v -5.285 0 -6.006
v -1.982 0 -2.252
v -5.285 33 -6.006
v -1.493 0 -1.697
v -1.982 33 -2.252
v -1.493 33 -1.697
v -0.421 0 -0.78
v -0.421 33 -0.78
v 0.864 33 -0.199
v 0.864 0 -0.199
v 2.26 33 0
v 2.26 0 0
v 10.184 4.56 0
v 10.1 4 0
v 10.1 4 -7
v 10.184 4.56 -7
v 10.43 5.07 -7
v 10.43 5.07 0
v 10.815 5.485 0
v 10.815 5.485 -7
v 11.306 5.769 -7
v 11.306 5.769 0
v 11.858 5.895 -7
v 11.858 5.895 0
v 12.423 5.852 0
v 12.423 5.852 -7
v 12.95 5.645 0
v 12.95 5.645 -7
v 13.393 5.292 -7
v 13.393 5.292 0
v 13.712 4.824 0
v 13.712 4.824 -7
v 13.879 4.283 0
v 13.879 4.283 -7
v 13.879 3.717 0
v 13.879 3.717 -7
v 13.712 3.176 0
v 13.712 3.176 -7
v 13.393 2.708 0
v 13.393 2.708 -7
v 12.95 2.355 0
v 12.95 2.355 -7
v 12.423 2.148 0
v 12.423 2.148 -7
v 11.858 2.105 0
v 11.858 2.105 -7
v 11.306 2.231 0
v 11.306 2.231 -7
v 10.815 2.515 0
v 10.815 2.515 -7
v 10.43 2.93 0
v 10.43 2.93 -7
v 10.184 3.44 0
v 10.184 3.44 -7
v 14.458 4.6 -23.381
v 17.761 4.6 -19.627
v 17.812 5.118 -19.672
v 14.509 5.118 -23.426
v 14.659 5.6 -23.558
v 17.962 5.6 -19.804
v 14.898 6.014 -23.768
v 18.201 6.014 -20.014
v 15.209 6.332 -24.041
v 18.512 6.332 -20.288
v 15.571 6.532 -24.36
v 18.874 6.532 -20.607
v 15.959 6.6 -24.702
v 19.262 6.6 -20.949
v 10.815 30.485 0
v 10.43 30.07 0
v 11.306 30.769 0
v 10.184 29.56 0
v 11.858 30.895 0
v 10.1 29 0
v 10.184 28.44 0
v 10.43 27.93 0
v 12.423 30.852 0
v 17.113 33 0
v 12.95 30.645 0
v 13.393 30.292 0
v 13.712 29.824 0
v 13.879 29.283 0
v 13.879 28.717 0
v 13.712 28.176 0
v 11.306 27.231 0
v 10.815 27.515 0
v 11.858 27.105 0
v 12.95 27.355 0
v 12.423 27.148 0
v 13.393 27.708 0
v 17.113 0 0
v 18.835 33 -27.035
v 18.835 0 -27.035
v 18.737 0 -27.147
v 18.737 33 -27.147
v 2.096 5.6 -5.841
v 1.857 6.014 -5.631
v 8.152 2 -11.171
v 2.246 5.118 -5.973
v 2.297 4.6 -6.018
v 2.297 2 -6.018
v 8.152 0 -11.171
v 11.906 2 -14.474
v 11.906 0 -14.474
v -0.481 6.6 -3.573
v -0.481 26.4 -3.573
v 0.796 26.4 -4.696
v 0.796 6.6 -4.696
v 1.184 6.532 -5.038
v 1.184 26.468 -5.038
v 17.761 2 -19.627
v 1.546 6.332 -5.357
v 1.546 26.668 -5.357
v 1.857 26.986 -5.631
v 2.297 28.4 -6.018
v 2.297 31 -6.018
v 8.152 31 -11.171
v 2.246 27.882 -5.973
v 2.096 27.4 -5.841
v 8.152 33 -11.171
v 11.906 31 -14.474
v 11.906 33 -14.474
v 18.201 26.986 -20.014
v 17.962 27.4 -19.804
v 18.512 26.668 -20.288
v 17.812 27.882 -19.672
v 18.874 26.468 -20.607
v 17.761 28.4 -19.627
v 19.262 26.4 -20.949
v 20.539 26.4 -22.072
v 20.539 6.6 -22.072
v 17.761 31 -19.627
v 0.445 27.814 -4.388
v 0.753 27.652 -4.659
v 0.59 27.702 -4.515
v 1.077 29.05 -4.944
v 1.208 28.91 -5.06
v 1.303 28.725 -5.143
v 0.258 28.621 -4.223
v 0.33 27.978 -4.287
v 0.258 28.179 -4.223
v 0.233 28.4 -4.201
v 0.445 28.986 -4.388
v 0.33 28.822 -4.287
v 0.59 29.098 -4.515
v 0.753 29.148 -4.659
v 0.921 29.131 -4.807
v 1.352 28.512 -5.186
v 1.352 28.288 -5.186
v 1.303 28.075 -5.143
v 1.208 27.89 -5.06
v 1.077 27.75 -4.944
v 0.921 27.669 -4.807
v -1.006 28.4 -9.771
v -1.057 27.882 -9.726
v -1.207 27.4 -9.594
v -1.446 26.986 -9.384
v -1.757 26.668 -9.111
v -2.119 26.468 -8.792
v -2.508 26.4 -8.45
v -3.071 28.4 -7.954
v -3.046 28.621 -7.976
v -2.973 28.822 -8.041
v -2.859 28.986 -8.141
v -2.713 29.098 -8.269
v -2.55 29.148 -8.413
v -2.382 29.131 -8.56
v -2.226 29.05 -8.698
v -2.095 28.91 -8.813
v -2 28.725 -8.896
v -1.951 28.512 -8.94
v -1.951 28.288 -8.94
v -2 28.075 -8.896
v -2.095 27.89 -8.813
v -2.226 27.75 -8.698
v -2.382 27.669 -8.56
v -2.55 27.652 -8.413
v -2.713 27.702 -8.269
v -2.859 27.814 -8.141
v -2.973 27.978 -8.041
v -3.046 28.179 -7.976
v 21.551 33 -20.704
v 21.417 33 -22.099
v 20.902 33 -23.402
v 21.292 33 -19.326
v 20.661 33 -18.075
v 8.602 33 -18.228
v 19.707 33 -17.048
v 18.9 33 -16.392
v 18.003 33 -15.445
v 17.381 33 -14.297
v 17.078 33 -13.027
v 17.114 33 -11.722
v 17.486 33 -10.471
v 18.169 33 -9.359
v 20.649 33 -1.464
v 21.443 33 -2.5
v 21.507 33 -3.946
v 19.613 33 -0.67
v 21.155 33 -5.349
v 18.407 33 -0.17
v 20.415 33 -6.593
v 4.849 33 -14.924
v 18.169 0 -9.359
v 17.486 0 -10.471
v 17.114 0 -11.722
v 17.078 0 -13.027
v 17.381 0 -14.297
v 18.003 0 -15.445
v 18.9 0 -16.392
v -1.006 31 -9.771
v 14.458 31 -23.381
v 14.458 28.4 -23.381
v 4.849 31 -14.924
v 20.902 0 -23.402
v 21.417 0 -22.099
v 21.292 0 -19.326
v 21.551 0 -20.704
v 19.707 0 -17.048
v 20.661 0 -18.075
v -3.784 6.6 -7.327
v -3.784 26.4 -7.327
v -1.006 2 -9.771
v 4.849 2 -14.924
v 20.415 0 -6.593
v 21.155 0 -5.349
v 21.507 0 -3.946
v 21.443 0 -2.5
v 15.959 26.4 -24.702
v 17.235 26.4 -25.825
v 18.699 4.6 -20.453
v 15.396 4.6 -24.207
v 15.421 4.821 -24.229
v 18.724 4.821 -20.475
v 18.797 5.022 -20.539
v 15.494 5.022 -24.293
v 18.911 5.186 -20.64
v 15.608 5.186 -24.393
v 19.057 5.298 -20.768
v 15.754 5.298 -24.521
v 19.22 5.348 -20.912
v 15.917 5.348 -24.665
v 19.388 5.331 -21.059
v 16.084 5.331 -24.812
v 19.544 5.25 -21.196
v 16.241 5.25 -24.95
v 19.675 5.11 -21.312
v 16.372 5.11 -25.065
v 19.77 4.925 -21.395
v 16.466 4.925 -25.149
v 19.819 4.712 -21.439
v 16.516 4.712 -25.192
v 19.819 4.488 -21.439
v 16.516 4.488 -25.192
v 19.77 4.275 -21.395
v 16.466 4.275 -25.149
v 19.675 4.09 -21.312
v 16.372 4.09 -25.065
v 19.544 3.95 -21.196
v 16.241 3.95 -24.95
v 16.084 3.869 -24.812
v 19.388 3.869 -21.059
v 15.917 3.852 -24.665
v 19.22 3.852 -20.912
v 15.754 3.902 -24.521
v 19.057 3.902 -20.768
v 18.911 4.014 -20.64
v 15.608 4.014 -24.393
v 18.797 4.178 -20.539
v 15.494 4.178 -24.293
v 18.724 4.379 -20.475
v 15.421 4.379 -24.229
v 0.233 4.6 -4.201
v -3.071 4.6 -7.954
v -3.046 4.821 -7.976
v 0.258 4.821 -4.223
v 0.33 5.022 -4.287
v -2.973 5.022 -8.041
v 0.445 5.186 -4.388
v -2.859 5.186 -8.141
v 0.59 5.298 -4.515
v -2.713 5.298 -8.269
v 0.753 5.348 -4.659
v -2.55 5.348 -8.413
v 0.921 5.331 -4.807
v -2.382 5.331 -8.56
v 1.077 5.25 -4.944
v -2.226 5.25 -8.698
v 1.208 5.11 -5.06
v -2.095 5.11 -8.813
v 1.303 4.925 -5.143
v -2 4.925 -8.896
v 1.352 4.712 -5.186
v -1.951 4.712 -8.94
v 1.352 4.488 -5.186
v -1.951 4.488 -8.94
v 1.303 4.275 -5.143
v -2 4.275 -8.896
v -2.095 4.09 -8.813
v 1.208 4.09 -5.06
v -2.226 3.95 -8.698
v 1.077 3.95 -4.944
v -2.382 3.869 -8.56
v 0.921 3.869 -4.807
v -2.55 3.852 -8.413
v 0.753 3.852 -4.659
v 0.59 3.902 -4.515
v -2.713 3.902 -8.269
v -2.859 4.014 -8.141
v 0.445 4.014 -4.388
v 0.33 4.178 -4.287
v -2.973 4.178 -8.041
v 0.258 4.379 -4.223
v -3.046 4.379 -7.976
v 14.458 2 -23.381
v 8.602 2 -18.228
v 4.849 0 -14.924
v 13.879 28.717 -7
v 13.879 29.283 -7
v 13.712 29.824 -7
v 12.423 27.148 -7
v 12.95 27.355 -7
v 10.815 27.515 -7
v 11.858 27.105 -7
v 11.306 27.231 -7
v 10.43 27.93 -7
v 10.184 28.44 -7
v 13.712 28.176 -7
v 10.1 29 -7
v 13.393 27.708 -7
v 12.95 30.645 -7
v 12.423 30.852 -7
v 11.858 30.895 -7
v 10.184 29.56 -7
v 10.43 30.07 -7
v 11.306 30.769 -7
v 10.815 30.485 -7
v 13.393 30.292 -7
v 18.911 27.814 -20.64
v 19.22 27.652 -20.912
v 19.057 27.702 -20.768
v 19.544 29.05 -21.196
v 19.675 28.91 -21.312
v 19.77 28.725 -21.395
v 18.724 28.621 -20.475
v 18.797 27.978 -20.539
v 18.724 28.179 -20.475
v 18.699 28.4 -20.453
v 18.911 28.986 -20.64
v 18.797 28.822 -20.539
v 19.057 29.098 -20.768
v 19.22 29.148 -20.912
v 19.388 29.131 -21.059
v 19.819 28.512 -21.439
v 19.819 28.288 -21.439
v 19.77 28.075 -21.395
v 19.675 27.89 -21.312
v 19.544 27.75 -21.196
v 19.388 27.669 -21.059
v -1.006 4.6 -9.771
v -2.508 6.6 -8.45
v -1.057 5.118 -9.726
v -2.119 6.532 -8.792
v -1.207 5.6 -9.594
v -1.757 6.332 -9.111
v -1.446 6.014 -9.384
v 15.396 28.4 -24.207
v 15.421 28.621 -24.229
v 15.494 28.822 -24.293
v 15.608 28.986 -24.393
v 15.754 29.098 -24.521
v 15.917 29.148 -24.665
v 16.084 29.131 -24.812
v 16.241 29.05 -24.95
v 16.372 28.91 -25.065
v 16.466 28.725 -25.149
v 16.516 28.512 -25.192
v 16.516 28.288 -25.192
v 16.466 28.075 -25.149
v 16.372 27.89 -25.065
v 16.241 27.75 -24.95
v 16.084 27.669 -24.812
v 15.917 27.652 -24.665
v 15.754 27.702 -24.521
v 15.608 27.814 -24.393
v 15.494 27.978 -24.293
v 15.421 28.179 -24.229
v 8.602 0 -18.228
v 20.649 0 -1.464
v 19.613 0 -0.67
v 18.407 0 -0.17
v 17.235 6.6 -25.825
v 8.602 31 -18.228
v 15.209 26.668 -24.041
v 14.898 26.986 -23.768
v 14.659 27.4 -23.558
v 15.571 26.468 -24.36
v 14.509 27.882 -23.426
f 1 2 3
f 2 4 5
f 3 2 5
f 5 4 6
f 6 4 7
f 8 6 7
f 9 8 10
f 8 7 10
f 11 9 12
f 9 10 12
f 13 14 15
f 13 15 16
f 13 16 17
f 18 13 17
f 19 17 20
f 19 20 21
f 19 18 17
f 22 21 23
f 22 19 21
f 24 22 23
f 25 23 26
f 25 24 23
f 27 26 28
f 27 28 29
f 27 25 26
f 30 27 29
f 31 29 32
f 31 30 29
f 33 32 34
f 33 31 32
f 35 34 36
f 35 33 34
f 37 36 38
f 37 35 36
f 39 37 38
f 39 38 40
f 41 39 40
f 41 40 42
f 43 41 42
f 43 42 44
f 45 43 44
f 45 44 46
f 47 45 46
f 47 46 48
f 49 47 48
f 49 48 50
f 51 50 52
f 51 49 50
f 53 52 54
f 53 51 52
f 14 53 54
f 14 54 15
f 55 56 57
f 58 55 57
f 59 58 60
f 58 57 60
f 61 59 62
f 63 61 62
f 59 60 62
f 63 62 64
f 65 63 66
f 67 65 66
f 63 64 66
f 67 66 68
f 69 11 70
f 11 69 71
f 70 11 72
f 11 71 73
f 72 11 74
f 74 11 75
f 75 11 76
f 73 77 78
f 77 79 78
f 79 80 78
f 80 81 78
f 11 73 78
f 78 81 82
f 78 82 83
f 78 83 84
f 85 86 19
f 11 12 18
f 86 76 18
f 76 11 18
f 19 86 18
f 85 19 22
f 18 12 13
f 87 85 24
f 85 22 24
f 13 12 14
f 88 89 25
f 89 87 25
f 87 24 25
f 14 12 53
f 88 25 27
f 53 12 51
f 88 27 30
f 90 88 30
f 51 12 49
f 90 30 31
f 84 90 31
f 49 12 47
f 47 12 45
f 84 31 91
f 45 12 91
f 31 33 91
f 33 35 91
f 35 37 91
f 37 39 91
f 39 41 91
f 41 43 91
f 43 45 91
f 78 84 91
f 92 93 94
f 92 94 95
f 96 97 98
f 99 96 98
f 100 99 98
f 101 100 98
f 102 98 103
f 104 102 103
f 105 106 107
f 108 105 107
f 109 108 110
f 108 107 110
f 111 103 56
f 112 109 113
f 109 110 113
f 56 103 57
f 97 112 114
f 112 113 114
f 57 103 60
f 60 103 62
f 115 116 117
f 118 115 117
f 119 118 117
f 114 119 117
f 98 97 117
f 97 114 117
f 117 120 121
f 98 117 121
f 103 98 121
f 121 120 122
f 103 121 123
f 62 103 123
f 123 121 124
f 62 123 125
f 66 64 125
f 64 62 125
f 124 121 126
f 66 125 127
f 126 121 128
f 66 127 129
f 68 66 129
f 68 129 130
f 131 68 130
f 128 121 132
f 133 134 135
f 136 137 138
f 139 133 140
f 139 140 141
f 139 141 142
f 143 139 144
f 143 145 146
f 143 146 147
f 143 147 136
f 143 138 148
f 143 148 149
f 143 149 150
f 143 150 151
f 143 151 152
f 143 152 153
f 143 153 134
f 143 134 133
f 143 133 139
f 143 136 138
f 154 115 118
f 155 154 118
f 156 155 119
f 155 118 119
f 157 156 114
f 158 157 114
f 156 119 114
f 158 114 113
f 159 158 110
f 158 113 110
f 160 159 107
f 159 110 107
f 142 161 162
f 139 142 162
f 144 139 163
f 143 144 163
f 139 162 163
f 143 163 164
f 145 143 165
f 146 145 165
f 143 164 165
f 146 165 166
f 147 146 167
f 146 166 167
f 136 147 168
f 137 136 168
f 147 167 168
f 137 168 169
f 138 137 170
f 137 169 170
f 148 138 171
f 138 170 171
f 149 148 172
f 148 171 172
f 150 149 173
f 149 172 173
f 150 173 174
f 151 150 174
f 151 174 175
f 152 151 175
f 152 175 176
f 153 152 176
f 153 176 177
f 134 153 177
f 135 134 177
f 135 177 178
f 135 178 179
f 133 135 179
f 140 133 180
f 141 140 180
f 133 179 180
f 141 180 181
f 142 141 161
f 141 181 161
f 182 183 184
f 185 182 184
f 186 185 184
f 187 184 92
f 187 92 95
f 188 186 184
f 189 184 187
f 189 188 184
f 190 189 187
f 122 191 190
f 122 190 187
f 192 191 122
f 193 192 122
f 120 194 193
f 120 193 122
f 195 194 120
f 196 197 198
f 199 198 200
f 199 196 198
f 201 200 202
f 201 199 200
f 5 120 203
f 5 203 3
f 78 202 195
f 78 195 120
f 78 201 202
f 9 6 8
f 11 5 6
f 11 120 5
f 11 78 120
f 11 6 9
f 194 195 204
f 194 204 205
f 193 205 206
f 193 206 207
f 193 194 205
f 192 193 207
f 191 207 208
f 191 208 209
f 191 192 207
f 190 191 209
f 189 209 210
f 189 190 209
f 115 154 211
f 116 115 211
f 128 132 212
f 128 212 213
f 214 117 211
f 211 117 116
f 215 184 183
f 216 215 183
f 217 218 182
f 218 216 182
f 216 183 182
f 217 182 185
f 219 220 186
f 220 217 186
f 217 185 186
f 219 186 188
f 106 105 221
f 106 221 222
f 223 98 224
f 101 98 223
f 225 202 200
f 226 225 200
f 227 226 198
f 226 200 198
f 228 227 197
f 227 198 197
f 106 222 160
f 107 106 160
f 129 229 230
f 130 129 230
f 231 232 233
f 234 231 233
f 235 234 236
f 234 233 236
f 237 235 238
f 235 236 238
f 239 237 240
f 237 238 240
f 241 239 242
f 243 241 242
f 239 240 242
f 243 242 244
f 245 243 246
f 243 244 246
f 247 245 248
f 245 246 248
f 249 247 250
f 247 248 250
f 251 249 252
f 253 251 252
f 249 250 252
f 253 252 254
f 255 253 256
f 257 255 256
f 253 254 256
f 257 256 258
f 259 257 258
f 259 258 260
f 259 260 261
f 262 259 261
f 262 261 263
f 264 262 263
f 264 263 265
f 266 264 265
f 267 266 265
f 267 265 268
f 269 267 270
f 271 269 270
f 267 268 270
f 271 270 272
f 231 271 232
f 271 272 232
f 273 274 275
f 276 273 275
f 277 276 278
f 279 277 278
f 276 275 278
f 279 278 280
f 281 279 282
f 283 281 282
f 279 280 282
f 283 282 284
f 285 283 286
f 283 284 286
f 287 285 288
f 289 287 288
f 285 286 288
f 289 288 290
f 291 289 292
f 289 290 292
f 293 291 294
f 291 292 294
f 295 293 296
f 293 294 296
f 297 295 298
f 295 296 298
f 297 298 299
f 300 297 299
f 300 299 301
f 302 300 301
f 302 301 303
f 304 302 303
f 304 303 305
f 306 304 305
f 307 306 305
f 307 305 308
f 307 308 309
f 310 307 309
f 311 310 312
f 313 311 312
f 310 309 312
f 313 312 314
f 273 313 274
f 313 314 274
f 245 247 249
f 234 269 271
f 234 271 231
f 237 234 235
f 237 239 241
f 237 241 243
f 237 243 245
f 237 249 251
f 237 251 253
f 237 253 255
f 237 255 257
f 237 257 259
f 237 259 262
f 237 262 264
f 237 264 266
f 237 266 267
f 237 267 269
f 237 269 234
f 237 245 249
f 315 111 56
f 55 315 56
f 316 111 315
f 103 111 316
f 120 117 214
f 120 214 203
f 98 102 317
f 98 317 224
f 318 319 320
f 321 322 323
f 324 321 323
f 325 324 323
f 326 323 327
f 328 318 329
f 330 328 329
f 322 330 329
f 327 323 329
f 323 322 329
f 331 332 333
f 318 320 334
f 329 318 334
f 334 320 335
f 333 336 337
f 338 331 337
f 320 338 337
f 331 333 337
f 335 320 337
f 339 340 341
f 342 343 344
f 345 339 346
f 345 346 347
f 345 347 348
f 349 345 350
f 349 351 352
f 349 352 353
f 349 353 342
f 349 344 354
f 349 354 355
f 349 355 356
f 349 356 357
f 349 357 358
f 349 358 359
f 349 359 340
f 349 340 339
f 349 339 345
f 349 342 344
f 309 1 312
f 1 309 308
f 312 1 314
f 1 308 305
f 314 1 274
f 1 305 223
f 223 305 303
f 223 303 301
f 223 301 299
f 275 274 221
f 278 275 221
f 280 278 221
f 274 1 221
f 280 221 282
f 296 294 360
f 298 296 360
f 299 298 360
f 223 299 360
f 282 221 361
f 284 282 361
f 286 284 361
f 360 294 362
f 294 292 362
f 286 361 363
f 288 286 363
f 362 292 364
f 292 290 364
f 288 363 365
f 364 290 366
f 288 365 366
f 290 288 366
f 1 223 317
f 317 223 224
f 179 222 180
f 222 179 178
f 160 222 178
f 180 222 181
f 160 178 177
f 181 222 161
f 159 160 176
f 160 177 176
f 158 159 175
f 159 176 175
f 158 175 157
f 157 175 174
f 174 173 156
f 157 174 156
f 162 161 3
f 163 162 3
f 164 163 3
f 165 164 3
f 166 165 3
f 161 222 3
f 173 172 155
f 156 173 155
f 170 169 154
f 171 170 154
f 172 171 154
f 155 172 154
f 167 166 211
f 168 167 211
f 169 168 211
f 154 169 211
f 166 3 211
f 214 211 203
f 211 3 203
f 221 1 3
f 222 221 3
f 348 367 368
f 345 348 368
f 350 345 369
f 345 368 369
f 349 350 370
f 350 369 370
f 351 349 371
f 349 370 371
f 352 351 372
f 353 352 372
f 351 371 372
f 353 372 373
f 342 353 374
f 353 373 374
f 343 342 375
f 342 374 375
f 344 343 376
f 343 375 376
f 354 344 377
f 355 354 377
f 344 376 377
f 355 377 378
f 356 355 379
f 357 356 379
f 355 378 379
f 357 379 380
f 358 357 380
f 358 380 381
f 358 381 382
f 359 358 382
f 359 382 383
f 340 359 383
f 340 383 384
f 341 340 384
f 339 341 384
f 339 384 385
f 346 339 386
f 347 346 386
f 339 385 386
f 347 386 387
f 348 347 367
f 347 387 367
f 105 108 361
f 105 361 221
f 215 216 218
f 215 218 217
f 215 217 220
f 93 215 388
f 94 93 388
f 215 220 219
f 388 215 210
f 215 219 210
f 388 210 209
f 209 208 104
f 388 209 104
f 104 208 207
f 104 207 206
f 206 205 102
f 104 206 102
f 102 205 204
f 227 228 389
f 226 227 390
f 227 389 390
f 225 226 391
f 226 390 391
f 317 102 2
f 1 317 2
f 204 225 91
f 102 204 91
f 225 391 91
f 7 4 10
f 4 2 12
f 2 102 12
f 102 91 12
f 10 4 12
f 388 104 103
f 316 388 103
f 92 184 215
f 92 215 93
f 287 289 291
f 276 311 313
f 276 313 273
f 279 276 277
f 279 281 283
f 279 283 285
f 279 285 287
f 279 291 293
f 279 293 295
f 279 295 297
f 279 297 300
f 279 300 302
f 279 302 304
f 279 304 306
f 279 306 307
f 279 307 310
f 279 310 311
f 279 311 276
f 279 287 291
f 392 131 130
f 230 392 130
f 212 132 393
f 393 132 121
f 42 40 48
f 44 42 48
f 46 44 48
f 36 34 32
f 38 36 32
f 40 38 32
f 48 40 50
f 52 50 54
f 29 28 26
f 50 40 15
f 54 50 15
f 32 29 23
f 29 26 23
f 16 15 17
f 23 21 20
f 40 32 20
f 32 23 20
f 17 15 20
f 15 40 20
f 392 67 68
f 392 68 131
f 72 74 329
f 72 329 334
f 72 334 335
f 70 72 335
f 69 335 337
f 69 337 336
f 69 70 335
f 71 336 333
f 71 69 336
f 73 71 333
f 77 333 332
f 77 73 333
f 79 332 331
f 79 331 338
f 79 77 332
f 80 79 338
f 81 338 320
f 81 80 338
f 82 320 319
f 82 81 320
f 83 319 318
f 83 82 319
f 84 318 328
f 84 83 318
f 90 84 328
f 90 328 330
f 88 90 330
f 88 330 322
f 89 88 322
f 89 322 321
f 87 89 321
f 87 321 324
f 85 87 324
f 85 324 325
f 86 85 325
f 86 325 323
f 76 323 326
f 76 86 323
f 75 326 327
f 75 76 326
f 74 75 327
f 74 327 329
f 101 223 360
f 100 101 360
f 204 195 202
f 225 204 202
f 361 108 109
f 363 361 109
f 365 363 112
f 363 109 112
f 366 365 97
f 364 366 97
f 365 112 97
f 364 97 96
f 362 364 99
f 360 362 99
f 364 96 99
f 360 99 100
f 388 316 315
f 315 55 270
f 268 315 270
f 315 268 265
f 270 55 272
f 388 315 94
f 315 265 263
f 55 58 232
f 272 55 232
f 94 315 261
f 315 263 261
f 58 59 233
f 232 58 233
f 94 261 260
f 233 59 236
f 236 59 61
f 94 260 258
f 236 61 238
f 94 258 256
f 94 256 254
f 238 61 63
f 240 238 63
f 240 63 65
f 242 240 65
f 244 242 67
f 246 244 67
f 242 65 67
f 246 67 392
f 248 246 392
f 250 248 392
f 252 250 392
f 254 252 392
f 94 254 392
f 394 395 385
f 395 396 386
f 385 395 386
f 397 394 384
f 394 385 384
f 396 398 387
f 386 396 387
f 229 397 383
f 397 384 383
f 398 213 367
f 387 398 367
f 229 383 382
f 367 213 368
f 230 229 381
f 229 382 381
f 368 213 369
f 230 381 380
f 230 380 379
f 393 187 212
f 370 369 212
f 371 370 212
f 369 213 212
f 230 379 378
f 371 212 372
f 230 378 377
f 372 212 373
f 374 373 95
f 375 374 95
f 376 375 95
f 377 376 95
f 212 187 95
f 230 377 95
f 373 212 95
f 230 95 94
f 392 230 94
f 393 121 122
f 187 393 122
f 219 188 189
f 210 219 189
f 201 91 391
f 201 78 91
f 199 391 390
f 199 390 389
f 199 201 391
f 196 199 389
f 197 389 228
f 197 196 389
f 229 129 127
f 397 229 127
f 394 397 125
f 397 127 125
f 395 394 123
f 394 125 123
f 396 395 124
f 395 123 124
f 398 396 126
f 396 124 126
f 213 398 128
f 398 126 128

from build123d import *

# Parameters (mm, degrees)
BOSS_EXTRUDE1_DEPTH = 33
SKETCH2_W           = 32
SKETCH2_H           = 33
BOSS_EXTRUDE2_DEPTH = 3
SKETCH3_R           = 1.9
CUT_EXTRUDE1_DEPTH  = 7
FILLET1_R           = 5
SKETCH5_R           = 2
BOSS_EXTRUDE3_DEPTH = 5
SKETCH6_W           = 32
SKETCH6_H           = 33
SKETCH6_W_2         = 28
SKETCH6_H_2         = 29
BOSS_EXTRUDE4_DEPTH = 5
BOSS_EXTRUDE5_DEPTH = 5
SKETCH7_R           = 0.75
SKETCH7_W           = 5
SKETCH7_H           = 119.688008906
CUT_EXTRUDE3_DEPTH  = 5
CUT_EXTRUDE4_DEPTH  = 53.302482054
CUT_EXTRUDE5_DEPTH  = 51.632111281
FILLET4_R           = 5


with BuildPart() as part:
    # Sketch1 → Boss-Extrude1 (new body)
    with BuildSketch(Plane(origin=(0, 0, 0), x_dir=(1, 0, 0), z_dir=(0, 1, 0))):
        Polygon((0, 0), (20, 0), (30.159835274, 17.597350892), (24.022012397, 21.141024582), align=None)
    extrude(amount=BOSS_EXTRUDE1_DEPTH)

    # Sketch2 → Boss-Extrude2 (add)
    with BuildSketch(Plane(origin=(0, 0, 0), x_dir=(0.7506878874077226, 0, -0.660657018201828), z_dir=(0.660657018201828, 0, 0.7506878874077226))):
        with Locations((16, 16.5)):
            Rectangle(SKETCH2_W, SKETCH2_H)
    extrude(amount=-BOSS_EXTRUDE2_DEPTH)

    # Sketch3 → Cut-Extrude1 (cut)
    with BuildSketch(Plane(origin=(30, 0, 0), x_dir=(-1, 0, 0), z_dir=(0, 0, -1))):
        with Locations((18, 29)):
            Circle(SKETCH3_R)
        with Locations((18, 4)):
            Circle(SKETCH3_R)
    extrude(amount=CUT_EXTRUDE1_DEPTH, mode=Mode.SUBTRACT)

    # Fillet1
    fillet1_edges = [part.edges().sort_by_distance(p)[0] for p in [
        (20, 16.5, 0),
    ]]
    fillet(fillet1_edges, radius=FILLET1_R)

    # Sketch5 → Boss-Extrude3 (add)
    with BuildSketch(Plane(origin=(-1.981971055, 0, -2.252063662), x_dir=(-0.7506878874077226, 0, 0.660657018201828), z_dir=(-0.660657018201828, 0, -0.7506878874077226))):
        with Locations((-28.3, 28.4)):
            Circle(SKETCH5_R)
        with Locations((-3.7, 28.4)):
            Circle(SKETCH5_R)
        with Locations((-28.3, 4.6)):
            Circle(SKETCH5_R)
        with Locations((-3.7, 4.6)):
            Circle(SKETCH5_R)
    extrude(amount=BOSS_EXTRUDE3_DEPTH)

    # Sketch6 → Boss-Extrude4 (add)
    with BuildSketch(Plane(origin=(-1.981971055, 0, -2.252063662), x_dir=(-0.7506878874077226, 0, 0.660657018201828), z_dir=(-0.660657018201828, 0, -0.7506878874077226))):
        with Locations((-16, 16.5)):
            Rectangle(SKETCH6_W, SKETCH6_H)
        with Locations((-16, 16.5)):
            Rectangle(SKETCH6_W_2, SKETCH6_H_2, mode=Mode.SUBTRACT)
    extrude(amount=BOSS_EXTRUDE4_DEPTH)

    # Sketch9 → Boss-Extrude5 (add)
    with BuildSketch(Plane(origin=(-1.981971055, 0, -2.252063662), x_dir=(-0.7506878874077226, 0, 0.660657018201828), z_dir=(-0.660657018201828, 0, -0.7506878874077226))):
        Polygon((-28.3, 26.4), (-30, 26.4), (-30, 31), (-26.3, 31), (-26.3, 28.4), align=None)
        Polygon((-5.7, 28.4), (-5.7, 31), (-2, 31), (-2, 26.4), (-3.7, 26.4), align=None)
        Polygon((-3.7, 6.6), (-2, 6.6), (-2, 2), (-5.7, 2), (-5.7, 4.6), align=None)
        Polygon((-28.3, 6.6), (-30, 6.6), (-30, 2), (-26.3, 2), (-26.3, 4.6), align=None)
    extrude(amount=BOSS_EXTRUDE5_DEPTH)

    # Sketch7 → Cut-Extrude3 (cut)
    with BuildSketch(Plane(origin=(-5.285256146, 0, -6.005503099), x_dir=(-0.7506878874077226, 0, 0.660657018201828), z_dir=(-0.660657018201828, 0, -0.7506878874077226))):
        with Locations((-28.3, 28.4)):
            Circle(SKETCH7_R)
        with Locations((-3.7, 28.4)):
            Circle(SKETCH7_R)
        with Locations((-3.7, 4.6)):
            Circle(SKETCH7_R)
        with Locations((-28.3, 4.6)):
            Circle(SKETCH7_R)
        with Locations((-16, 31)):
            Rectangle(SKETCH7_W, SKETCH7_H)
    extrude(amount=-CUT_EXTRUDE3_DEPTH, mode=Mode.SUBTRACT)

    # Sketch8 → Cut-Extrude4 (cut, through all)
    with BuildSketch(Plane(origin=(0, 33, 0), x_dir=(1, 0, 0), z_dir=(0, 1, 0))):
        Polygon((17.745348673, 28.950001735), (16.878144986, 39.625600728), (45.212516216, 18.101512889), (33.036600924, 2.073102927), align=None)
    extrude(amount=-CUT_EXTRUDE4_DEPTH, mode=Mode.SUBTRACT)

    # Sketch10 → Cut-Extrude5 (cut, through all)
    with BuildSketch(Plane(origin=(0, 33, 0), x_dir=(1, 0, 0), z_dir=(0, 1, 0))):
        Polygon((22.997492955, 19.718491584), (15.018022413, 13.241165816), (22.396735909, 4.151268367), (32.809004156, 12.603414793), align=None)
    extrude(amount=-CUT_EXTRUDE5_DEPTH, mode=Mode.SUBTRACT)

    # Fillet4
    # the kernel refuses this fillet: 5 mm, written as the material it adds along each edge
    with BuildSketch(Plane(origin=(15.018022413, 33, -13.241165816), x_dir=(0.7763993545799179, 0, -0.6302412571451403), z_dir=(0, -1, 0))) as fillet4_piece_1:
        with BuildLine():
            CenterArc((FILLET4_R, FILLET4_R), FILLET4_R, 180, 90)
            Line((0, FILLET4_R), (0, 0))
            Line((0, 0), (FILLET4_R, 0))
        make_face()
    extrude(amount=33)
    # the kernel refuses this fillet: 5 mm, written as the material it takes off along each edge
    with BuildSketch(Plane(origin=(22.396735909, 40.861690342, -4.151268367), x_dir=(-0.6302412571451408, 0, -0.7763993545799174), z_dir=(0, -1, 0))) as fillet4_2_piece_1:
        with BuildLine():
            CenterArc((3.144676137, -5), FILLET4_R, 90, 49.922525522)
            Line((-0.681196741, -1.780885723), (0, 0))
            Line((0, 0), (3.144676137, 0))
        make_face()
    extrude(amount=48.723380684, mode=Mode.SUBTRACT)
    with BuildSketch(Plane(origin=(22.997492955, 43.594997798, -19.718491584), x_dir=(-0.4945052818029634, 0, -0.8691746235762823), z_dir=(0, -1, 0))) as fillet4_2_piece_2:
        with BuildLine():
            CenterArc((FILLET4_R * 0.847599823854, -FILLET4_R), FILLET4_R, 90, 80.569209056)
            Line((-FILLET4_R * 0.138884423377, -FILLET4_R * 0.836143874187), (0, 0))
            Line((0, 0), (FILLET4_R * 0.847599823854, 0))
        make_face()
    extrude(amount=54.189995596, mode=Mode.SUBTRACT)
    with BuildSketch(Plane(origin=(0, -5.650533789, 0), x_dir=(1, 0, 0), z_dir=(0, 1, 0))) as fillet4_2_piece_3:
        with BuildLine():
            CenterArc((FILLET4_R * 0.452042703087, FILLET4_R), FILLET4_R, 221.35, 48.65)
            Line((-FILLET4_R * 0.298645184321, FILLET4_R * 0.339342981798), (0, 0))
            Line((0, 0), (FILLET4_R * 0.452042703087, 0))
        make_face()
    extrude(amount=44.301067577, mode=Mode.SUBTRACT)


solid = part.part
